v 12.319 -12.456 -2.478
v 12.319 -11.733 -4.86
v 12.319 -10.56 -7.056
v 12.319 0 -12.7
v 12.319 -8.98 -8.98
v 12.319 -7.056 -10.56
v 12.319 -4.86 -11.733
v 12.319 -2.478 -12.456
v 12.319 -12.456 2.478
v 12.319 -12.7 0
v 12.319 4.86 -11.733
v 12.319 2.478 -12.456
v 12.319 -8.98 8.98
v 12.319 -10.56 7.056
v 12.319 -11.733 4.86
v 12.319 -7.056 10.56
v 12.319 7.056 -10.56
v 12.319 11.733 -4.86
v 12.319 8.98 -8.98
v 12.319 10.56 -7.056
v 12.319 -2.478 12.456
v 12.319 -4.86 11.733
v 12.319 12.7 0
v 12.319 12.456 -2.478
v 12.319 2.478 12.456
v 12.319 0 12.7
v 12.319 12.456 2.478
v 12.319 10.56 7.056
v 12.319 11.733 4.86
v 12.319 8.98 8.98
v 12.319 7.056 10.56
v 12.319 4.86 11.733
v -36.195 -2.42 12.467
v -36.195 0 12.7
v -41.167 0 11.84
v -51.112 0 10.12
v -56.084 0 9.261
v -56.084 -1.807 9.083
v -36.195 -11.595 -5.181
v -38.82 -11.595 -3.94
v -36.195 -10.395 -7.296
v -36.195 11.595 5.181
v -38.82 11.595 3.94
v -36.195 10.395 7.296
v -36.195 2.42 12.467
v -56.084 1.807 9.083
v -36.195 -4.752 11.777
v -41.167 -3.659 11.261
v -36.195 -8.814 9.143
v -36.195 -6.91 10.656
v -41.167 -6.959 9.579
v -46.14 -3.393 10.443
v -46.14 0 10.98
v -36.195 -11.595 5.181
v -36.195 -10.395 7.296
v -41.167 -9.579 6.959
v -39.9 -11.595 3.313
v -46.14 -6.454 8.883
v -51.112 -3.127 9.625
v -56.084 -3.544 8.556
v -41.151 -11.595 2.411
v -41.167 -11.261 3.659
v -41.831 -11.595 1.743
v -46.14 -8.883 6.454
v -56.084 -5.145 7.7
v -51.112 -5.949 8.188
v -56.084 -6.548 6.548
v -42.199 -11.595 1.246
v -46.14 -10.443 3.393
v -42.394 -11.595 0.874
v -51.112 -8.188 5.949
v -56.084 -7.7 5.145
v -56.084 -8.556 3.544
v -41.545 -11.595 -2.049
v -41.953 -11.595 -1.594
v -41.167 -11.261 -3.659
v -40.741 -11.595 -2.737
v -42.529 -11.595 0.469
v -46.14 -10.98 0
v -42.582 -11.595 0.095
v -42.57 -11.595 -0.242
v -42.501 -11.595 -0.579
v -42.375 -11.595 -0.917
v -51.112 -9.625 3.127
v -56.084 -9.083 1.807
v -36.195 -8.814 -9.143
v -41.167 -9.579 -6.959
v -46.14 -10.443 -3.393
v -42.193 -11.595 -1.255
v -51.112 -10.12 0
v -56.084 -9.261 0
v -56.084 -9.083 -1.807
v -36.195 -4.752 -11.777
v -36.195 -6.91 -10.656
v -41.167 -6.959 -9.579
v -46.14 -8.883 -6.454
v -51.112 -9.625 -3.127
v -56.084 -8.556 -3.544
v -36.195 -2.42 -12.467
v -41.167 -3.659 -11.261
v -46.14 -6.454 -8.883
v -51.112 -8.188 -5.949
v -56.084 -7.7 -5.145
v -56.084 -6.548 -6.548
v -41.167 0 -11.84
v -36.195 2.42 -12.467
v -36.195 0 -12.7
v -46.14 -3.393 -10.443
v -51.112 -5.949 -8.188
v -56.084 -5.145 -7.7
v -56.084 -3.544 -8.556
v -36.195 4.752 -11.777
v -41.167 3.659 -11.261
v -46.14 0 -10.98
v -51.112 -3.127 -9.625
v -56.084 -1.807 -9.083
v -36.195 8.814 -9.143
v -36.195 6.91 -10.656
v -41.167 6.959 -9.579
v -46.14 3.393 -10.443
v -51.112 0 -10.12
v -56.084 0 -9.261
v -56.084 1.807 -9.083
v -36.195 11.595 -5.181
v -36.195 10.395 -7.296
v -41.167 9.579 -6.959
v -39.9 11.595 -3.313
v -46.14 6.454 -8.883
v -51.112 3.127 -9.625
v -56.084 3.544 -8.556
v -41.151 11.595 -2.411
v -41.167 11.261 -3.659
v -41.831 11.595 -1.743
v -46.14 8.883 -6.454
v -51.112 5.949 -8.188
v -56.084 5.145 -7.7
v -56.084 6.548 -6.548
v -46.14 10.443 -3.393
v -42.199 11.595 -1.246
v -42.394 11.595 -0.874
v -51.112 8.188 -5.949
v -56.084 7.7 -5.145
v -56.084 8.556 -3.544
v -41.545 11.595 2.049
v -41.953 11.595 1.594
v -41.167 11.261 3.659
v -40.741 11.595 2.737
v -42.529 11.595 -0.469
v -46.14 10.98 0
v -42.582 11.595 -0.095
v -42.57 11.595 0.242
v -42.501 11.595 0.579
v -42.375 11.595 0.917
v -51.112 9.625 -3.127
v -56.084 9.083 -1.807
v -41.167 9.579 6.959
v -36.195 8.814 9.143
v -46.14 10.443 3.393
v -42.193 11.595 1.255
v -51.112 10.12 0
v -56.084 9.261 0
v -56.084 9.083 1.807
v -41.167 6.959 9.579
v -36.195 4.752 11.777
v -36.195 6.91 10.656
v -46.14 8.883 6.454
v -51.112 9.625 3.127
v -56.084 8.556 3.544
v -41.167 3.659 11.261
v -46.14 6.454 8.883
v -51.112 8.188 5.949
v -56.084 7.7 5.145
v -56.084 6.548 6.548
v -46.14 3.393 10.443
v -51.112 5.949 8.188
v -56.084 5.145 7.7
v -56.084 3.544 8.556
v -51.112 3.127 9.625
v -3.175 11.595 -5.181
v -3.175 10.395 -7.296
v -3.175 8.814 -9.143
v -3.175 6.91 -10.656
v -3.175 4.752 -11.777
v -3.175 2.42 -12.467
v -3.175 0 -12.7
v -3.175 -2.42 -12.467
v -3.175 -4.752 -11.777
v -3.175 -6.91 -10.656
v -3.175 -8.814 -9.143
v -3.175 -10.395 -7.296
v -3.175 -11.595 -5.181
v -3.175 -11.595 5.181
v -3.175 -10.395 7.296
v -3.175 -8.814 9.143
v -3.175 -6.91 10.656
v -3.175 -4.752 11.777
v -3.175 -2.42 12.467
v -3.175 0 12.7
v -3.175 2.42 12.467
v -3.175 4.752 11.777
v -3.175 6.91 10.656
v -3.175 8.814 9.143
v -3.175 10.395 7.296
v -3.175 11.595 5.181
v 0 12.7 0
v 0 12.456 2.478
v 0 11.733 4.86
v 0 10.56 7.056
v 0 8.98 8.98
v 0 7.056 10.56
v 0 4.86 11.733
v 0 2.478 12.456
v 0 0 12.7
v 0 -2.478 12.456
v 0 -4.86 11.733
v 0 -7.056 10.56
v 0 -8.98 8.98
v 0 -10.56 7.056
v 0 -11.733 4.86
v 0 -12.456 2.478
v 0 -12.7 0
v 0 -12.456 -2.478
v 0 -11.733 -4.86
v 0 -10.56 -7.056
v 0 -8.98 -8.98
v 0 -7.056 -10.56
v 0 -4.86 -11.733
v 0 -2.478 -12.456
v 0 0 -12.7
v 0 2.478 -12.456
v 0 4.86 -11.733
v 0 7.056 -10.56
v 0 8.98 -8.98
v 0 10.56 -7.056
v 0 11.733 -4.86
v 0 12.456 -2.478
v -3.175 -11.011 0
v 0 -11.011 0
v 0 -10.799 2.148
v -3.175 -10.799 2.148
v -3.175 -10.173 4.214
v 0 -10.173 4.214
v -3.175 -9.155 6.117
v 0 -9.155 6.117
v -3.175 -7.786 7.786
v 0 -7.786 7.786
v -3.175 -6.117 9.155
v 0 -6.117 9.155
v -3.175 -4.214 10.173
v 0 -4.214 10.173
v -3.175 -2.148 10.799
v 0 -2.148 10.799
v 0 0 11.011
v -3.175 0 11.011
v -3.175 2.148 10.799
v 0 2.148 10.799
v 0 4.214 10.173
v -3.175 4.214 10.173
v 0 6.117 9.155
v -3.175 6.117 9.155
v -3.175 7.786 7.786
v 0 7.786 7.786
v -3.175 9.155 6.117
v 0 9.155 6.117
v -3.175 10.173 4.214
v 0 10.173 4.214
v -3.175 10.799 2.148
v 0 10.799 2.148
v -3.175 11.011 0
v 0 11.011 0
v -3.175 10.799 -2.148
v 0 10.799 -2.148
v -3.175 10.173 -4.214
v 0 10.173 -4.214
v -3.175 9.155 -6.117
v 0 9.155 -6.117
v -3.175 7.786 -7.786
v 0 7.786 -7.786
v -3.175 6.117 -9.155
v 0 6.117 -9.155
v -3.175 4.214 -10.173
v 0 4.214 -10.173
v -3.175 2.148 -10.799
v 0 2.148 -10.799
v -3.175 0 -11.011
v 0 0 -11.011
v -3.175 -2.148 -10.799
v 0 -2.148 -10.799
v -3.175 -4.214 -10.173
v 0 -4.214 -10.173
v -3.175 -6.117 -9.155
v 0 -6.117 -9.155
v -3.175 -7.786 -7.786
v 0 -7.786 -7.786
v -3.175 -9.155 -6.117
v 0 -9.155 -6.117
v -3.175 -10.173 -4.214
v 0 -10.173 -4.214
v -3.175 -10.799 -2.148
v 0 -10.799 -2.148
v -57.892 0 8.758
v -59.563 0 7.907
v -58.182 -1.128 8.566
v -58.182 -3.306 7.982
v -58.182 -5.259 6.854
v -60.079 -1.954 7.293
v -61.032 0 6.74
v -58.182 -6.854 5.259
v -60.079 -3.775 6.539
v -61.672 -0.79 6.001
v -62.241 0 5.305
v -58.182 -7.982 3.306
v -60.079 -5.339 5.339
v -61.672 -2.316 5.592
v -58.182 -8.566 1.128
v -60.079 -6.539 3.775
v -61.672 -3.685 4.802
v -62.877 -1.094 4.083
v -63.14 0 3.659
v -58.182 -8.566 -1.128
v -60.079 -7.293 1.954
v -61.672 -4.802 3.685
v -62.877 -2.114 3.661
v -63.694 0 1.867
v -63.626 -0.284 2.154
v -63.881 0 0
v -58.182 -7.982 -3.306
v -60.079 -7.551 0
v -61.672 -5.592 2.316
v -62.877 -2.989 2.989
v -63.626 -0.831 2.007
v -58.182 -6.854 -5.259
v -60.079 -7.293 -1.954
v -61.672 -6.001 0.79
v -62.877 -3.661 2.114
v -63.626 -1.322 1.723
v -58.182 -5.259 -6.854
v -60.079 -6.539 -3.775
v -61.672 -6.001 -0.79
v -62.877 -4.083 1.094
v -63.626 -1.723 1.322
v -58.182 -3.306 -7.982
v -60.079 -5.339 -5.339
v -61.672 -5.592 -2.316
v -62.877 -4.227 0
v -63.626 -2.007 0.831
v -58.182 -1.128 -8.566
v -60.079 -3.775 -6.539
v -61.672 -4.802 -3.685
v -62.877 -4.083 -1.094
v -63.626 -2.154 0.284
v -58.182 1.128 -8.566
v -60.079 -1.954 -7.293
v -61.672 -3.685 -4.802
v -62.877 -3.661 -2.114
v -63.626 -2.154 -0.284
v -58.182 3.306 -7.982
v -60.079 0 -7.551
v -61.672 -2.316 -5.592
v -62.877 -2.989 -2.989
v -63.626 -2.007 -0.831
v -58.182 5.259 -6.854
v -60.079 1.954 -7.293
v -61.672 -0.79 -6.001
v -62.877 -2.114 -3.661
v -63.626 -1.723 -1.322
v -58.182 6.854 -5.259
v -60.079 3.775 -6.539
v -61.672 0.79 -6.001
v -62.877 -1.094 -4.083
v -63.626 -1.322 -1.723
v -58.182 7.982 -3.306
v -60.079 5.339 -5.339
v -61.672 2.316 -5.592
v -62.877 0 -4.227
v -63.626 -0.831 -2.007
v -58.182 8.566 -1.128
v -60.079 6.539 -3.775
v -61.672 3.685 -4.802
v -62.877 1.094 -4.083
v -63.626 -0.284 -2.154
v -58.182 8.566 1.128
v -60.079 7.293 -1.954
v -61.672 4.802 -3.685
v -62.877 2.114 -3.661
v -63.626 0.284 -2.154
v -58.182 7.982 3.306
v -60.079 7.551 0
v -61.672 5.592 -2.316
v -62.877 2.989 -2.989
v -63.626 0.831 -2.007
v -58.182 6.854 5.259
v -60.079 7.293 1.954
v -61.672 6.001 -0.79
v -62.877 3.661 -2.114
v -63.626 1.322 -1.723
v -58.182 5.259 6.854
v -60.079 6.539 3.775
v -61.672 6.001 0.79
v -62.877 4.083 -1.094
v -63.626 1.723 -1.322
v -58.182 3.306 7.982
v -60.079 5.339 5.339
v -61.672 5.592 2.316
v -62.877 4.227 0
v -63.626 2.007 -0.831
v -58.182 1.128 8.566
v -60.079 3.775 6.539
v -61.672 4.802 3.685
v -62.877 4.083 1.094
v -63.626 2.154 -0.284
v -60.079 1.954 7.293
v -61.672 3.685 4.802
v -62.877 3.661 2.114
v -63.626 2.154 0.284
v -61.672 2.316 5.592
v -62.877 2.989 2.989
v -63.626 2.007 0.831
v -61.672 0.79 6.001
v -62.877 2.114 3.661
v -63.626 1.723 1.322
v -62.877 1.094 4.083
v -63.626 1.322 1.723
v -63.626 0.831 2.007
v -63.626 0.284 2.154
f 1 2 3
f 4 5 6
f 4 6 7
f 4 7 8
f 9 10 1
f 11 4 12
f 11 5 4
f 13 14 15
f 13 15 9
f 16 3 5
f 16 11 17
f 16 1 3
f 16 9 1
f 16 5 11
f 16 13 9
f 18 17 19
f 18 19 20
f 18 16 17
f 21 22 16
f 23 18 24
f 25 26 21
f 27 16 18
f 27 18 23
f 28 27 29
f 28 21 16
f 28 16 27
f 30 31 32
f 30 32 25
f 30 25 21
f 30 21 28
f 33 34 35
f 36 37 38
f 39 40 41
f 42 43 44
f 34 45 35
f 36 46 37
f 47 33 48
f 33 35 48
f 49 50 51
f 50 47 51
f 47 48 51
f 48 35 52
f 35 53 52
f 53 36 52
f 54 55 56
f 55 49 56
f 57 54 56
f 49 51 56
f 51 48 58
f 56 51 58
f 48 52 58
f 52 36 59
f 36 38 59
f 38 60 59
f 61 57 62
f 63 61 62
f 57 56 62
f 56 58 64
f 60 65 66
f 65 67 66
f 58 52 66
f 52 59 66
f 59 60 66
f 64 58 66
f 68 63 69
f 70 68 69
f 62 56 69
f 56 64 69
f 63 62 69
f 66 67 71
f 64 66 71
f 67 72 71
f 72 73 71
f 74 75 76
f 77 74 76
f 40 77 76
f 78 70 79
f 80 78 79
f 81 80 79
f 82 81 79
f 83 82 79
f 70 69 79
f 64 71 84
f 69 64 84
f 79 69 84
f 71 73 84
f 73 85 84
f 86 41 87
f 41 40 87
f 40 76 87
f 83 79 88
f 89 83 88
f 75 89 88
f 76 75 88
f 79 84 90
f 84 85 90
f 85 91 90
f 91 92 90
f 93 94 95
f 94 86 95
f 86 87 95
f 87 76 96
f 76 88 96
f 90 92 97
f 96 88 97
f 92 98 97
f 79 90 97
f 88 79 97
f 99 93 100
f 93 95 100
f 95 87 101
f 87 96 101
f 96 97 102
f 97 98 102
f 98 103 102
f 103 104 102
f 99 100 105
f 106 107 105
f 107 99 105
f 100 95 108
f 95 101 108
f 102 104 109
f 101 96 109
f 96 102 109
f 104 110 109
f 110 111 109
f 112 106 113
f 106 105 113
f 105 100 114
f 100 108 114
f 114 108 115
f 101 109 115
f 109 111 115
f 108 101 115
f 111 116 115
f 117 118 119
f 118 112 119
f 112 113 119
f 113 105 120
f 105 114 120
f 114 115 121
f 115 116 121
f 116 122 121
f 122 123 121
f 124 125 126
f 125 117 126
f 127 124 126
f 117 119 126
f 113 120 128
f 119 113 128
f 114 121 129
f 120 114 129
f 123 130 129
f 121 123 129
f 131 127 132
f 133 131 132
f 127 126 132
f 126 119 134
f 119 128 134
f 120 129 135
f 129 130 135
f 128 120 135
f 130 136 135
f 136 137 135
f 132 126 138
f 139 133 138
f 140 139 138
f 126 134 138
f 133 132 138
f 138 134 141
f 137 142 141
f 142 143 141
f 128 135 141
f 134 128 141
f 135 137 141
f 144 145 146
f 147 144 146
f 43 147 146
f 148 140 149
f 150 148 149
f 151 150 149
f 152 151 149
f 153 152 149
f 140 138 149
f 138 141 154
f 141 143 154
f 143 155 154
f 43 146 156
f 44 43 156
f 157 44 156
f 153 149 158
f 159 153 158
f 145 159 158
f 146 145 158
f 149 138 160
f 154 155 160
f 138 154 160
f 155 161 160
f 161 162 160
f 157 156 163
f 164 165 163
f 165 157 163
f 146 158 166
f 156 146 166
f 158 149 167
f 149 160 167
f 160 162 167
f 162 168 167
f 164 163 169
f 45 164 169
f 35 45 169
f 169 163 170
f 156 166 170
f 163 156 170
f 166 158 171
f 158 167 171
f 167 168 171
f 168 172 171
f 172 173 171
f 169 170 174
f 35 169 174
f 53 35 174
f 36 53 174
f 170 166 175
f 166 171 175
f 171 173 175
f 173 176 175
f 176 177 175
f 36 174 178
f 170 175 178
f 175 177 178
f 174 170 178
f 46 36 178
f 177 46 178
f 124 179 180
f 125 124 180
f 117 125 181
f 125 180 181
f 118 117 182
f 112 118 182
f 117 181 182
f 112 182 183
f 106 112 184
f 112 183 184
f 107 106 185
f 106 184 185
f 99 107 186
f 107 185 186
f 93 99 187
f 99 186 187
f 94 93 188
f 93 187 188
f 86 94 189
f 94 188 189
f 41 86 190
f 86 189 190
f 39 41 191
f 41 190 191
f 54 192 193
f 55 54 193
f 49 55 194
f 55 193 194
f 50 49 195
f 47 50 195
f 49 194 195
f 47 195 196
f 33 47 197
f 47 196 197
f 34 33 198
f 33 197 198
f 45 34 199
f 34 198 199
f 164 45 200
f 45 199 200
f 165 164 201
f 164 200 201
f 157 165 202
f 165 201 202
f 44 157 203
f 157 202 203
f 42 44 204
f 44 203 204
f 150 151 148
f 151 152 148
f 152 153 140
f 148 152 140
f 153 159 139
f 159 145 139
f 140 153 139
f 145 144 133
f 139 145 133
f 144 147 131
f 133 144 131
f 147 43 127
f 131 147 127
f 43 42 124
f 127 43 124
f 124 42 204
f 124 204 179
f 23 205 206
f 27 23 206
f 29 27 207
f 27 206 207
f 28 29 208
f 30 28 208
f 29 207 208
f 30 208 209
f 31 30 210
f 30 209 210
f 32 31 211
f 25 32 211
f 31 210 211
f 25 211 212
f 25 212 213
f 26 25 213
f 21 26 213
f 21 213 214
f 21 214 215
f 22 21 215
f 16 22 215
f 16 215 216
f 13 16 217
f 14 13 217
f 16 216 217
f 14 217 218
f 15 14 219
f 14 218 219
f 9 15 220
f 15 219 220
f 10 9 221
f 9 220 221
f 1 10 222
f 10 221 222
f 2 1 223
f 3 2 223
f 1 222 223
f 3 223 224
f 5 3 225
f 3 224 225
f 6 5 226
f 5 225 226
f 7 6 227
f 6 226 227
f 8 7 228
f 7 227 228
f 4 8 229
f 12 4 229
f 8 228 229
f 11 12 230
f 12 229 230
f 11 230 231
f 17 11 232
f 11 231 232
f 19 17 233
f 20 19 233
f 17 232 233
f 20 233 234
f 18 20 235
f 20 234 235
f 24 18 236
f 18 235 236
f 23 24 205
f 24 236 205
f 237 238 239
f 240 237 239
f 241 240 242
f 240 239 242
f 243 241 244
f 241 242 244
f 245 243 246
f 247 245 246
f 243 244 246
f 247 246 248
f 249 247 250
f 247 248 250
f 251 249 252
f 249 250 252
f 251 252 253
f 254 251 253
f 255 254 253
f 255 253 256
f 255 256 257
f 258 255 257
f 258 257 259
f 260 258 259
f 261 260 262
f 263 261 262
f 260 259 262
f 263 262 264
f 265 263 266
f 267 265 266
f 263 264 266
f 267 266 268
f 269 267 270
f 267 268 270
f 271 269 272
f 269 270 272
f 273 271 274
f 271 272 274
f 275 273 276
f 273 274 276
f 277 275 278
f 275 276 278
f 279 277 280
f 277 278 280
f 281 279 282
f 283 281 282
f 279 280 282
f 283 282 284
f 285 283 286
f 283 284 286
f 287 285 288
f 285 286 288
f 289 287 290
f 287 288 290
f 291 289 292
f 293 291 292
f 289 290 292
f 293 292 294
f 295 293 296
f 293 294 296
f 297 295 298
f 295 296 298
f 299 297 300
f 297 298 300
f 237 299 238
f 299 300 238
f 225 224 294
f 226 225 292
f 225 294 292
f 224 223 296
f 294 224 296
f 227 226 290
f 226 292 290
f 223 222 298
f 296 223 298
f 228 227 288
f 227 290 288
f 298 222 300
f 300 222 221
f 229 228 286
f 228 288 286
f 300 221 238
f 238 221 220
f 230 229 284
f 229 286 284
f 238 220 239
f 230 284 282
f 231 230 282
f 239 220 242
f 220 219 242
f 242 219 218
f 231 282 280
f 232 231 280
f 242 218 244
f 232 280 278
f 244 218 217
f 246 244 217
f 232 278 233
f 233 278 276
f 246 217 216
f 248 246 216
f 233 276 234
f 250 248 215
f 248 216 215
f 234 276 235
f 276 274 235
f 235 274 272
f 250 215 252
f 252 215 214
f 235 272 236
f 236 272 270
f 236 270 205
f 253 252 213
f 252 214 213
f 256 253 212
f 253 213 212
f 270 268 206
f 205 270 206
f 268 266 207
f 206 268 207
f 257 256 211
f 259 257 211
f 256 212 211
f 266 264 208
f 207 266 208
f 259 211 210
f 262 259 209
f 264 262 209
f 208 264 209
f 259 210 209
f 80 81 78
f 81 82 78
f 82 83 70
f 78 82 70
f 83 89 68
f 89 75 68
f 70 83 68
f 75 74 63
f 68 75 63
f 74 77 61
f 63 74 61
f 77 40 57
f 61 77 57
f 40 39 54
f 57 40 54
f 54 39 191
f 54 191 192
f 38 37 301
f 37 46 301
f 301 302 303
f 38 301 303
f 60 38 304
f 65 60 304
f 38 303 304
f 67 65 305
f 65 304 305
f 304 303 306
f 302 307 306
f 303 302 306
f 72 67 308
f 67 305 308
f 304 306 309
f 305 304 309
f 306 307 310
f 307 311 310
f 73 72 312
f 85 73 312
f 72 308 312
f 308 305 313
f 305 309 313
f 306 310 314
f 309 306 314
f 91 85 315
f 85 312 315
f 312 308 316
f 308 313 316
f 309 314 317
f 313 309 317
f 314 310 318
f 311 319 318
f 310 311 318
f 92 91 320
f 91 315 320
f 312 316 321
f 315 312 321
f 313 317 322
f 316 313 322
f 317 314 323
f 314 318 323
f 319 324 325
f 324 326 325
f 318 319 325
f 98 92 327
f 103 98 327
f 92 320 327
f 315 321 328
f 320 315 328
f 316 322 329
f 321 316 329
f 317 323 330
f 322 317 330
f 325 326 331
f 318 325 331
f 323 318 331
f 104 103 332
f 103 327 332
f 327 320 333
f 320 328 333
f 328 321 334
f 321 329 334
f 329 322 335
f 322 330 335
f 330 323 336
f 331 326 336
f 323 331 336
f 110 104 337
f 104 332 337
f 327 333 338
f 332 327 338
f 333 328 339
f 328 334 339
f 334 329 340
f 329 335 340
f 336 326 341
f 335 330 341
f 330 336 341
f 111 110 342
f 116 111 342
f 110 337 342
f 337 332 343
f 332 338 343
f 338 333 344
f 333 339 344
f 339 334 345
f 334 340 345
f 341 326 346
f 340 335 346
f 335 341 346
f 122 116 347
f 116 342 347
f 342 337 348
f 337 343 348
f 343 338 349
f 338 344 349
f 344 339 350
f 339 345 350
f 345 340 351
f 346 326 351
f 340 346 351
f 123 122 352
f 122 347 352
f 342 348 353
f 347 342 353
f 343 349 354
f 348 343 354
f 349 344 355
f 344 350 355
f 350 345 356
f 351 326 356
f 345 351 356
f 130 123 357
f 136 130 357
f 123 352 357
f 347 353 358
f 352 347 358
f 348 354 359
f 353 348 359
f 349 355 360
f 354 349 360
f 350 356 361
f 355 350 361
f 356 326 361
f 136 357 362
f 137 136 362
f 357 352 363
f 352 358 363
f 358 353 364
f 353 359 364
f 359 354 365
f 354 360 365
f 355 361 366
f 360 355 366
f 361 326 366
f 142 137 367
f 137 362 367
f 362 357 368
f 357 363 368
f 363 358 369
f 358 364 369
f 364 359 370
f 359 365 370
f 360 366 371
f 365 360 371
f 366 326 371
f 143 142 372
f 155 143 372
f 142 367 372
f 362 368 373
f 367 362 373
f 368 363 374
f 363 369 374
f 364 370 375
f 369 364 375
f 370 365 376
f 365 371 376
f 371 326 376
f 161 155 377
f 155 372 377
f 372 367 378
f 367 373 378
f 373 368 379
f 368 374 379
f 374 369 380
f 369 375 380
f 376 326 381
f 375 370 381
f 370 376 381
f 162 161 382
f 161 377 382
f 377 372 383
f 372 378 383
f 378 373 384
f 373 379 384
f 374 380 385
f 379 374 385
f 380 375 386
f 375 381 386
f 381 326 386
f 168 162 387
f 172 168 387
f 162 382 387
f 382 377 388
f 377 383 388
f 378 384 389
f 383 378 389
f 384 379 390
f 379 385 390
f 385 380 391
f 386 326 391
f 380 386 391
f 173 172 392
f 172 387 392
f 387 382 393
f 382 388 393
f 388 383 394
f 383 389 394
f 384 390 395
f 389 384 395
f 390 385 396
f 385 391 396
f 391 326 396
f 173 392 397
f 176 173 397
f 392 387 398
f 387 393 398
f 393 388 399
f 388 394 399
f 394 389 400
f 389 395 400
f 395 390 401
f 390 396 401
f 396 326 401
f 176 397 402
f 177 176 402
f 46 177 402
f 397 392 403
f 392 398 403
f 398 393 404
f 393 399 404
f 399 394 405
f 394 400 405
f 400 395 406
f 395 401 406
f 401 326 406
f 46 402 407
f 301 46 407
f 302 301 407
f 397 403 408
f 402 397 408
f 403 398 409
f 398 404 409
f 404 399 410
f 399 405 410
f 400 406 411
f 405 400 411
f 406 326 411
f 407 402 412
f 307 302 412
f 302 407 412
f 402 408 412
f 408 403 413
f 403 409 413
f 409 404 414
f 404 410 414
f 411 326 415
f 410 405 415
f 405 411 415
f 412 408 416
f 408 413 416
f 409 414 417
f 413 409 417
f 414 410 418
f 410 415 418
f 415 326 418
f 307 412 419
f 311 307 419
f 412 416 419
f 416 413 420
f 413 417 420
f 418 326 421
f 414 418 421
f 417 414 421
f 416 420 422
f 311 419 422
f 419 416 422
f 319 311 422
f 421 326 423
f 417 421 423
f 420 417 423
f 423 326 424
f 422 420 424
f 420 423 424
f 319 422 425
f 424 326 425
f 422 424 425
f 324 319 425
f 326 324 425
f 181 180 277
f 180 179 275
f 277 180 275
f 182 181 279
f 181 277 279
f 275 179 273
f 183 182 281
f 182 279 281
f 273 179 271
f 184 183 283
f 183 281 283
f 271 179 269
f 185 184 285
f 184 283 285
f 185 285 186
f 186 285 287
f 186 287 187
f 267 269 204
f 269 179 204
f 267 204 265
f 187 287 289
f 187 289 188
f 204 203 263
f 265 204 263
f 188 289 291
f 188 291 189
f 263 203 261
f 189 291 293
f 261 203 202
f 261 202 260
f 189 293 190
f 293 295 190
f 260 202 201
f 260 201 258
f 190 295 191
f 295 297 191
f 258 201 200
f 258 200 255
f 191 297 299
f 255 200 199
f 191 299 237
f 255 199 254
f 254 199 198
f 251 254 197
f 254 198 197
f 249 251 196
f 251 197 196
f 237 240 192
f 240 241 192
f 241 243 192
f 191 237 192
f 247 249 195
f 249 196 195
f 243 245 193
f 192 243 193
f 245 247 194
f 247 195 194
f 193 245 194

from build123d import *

# Parameters (mm, degrees)
F0_R      = 12.7
F1_DEPTH  = 12.319
F2_R      = 11.0109
F3_DEPTH  = 3.175
F5_DEPTH  = 33.02
F9_DEPTH  = 25.4
F10_DEPTH = 25.4


with BuildPart() as f1:
    # F0 (on Right) → F1 (new body)
    with BuildSketch(Plane.YZ):
        Circle(F0_R)
    extrude(amount=F1_DEPTH)

    # F2 (on face) → F3 (join)
    with BuildSketch(Plane(origin=(0, 0, 0), x_dir=(0, -1, 0), z_dir=(-1, 0, 0))):
        Circle(F2_R)
    extrude(amount=F3_DEPTH)

    # F4 (on face) → F5 (join)
    with BuildSketch(Plane(origin=(-3.175, 0, 0), x_dir=(0, -1, 0), z_dir=(-1, 0, 0))):
        with BuildLine():
            Line((-11.5951, 5.1810863716), (-11.5951, -5.1810863716))
            ThreePointArc((-11.5951, -5.1810863716), (0, -12.7), (11.5951, -5.1810863716))
            Line((11.5951, -5.1810863716), (11.5951, 5.1810863716))
            ThreePointArc((11.5951, 5.1810863716), (0, 12.7), (-11.5951, 5.1810863716))
        make_face()
    extrude(amount=F5_DEPTH)

    # F6 (on Front) → F7 (revolve)
    with BuildSketch(Plane.XZ):
        with BuildLine():
            Line((-36.195, 12.7), (-56.0844132237, 9.2605550421))
            ThreePointArc((-56.0844132237, 9.2605550421), (-61.6723144832, 6.0527812832), (-63.881, 0))
            Line((-63.881, 0), (-36.195, 0))
            Line((-36.195, 0), (-36.195, 12.7))
        make_face()
    revolve(axis=Axis((-50.038, 0, 0), (1, 0, 0)))

    # F8 (on face) → F9 (cut)
    with BuildSketch(Plane.YZ.offset(-36.195)):
        with BuildLine():
            Line((-11.5951, -5.1810863716), (-11.5951, 5.1810863716))
            ThreePointArc((-11.5951, 5.1810863716), (-12.7, 0), (-11.5951, -5.1810863716))
        make_face()
    extrude(amount=-F9_DEPTH, mode=Mode.SUBTRACT)

    # F10 (cut): a face of the model
    f10_faces = [f1.faces().sort_by_distance(p)[0] for p in [
        (-36.195, 12.0387504501, 0),
    ]]
    extrude(f10_faces, amount=-F10_DEPTH, mode=Mode.SUBTRACT)


solid = f1.part
